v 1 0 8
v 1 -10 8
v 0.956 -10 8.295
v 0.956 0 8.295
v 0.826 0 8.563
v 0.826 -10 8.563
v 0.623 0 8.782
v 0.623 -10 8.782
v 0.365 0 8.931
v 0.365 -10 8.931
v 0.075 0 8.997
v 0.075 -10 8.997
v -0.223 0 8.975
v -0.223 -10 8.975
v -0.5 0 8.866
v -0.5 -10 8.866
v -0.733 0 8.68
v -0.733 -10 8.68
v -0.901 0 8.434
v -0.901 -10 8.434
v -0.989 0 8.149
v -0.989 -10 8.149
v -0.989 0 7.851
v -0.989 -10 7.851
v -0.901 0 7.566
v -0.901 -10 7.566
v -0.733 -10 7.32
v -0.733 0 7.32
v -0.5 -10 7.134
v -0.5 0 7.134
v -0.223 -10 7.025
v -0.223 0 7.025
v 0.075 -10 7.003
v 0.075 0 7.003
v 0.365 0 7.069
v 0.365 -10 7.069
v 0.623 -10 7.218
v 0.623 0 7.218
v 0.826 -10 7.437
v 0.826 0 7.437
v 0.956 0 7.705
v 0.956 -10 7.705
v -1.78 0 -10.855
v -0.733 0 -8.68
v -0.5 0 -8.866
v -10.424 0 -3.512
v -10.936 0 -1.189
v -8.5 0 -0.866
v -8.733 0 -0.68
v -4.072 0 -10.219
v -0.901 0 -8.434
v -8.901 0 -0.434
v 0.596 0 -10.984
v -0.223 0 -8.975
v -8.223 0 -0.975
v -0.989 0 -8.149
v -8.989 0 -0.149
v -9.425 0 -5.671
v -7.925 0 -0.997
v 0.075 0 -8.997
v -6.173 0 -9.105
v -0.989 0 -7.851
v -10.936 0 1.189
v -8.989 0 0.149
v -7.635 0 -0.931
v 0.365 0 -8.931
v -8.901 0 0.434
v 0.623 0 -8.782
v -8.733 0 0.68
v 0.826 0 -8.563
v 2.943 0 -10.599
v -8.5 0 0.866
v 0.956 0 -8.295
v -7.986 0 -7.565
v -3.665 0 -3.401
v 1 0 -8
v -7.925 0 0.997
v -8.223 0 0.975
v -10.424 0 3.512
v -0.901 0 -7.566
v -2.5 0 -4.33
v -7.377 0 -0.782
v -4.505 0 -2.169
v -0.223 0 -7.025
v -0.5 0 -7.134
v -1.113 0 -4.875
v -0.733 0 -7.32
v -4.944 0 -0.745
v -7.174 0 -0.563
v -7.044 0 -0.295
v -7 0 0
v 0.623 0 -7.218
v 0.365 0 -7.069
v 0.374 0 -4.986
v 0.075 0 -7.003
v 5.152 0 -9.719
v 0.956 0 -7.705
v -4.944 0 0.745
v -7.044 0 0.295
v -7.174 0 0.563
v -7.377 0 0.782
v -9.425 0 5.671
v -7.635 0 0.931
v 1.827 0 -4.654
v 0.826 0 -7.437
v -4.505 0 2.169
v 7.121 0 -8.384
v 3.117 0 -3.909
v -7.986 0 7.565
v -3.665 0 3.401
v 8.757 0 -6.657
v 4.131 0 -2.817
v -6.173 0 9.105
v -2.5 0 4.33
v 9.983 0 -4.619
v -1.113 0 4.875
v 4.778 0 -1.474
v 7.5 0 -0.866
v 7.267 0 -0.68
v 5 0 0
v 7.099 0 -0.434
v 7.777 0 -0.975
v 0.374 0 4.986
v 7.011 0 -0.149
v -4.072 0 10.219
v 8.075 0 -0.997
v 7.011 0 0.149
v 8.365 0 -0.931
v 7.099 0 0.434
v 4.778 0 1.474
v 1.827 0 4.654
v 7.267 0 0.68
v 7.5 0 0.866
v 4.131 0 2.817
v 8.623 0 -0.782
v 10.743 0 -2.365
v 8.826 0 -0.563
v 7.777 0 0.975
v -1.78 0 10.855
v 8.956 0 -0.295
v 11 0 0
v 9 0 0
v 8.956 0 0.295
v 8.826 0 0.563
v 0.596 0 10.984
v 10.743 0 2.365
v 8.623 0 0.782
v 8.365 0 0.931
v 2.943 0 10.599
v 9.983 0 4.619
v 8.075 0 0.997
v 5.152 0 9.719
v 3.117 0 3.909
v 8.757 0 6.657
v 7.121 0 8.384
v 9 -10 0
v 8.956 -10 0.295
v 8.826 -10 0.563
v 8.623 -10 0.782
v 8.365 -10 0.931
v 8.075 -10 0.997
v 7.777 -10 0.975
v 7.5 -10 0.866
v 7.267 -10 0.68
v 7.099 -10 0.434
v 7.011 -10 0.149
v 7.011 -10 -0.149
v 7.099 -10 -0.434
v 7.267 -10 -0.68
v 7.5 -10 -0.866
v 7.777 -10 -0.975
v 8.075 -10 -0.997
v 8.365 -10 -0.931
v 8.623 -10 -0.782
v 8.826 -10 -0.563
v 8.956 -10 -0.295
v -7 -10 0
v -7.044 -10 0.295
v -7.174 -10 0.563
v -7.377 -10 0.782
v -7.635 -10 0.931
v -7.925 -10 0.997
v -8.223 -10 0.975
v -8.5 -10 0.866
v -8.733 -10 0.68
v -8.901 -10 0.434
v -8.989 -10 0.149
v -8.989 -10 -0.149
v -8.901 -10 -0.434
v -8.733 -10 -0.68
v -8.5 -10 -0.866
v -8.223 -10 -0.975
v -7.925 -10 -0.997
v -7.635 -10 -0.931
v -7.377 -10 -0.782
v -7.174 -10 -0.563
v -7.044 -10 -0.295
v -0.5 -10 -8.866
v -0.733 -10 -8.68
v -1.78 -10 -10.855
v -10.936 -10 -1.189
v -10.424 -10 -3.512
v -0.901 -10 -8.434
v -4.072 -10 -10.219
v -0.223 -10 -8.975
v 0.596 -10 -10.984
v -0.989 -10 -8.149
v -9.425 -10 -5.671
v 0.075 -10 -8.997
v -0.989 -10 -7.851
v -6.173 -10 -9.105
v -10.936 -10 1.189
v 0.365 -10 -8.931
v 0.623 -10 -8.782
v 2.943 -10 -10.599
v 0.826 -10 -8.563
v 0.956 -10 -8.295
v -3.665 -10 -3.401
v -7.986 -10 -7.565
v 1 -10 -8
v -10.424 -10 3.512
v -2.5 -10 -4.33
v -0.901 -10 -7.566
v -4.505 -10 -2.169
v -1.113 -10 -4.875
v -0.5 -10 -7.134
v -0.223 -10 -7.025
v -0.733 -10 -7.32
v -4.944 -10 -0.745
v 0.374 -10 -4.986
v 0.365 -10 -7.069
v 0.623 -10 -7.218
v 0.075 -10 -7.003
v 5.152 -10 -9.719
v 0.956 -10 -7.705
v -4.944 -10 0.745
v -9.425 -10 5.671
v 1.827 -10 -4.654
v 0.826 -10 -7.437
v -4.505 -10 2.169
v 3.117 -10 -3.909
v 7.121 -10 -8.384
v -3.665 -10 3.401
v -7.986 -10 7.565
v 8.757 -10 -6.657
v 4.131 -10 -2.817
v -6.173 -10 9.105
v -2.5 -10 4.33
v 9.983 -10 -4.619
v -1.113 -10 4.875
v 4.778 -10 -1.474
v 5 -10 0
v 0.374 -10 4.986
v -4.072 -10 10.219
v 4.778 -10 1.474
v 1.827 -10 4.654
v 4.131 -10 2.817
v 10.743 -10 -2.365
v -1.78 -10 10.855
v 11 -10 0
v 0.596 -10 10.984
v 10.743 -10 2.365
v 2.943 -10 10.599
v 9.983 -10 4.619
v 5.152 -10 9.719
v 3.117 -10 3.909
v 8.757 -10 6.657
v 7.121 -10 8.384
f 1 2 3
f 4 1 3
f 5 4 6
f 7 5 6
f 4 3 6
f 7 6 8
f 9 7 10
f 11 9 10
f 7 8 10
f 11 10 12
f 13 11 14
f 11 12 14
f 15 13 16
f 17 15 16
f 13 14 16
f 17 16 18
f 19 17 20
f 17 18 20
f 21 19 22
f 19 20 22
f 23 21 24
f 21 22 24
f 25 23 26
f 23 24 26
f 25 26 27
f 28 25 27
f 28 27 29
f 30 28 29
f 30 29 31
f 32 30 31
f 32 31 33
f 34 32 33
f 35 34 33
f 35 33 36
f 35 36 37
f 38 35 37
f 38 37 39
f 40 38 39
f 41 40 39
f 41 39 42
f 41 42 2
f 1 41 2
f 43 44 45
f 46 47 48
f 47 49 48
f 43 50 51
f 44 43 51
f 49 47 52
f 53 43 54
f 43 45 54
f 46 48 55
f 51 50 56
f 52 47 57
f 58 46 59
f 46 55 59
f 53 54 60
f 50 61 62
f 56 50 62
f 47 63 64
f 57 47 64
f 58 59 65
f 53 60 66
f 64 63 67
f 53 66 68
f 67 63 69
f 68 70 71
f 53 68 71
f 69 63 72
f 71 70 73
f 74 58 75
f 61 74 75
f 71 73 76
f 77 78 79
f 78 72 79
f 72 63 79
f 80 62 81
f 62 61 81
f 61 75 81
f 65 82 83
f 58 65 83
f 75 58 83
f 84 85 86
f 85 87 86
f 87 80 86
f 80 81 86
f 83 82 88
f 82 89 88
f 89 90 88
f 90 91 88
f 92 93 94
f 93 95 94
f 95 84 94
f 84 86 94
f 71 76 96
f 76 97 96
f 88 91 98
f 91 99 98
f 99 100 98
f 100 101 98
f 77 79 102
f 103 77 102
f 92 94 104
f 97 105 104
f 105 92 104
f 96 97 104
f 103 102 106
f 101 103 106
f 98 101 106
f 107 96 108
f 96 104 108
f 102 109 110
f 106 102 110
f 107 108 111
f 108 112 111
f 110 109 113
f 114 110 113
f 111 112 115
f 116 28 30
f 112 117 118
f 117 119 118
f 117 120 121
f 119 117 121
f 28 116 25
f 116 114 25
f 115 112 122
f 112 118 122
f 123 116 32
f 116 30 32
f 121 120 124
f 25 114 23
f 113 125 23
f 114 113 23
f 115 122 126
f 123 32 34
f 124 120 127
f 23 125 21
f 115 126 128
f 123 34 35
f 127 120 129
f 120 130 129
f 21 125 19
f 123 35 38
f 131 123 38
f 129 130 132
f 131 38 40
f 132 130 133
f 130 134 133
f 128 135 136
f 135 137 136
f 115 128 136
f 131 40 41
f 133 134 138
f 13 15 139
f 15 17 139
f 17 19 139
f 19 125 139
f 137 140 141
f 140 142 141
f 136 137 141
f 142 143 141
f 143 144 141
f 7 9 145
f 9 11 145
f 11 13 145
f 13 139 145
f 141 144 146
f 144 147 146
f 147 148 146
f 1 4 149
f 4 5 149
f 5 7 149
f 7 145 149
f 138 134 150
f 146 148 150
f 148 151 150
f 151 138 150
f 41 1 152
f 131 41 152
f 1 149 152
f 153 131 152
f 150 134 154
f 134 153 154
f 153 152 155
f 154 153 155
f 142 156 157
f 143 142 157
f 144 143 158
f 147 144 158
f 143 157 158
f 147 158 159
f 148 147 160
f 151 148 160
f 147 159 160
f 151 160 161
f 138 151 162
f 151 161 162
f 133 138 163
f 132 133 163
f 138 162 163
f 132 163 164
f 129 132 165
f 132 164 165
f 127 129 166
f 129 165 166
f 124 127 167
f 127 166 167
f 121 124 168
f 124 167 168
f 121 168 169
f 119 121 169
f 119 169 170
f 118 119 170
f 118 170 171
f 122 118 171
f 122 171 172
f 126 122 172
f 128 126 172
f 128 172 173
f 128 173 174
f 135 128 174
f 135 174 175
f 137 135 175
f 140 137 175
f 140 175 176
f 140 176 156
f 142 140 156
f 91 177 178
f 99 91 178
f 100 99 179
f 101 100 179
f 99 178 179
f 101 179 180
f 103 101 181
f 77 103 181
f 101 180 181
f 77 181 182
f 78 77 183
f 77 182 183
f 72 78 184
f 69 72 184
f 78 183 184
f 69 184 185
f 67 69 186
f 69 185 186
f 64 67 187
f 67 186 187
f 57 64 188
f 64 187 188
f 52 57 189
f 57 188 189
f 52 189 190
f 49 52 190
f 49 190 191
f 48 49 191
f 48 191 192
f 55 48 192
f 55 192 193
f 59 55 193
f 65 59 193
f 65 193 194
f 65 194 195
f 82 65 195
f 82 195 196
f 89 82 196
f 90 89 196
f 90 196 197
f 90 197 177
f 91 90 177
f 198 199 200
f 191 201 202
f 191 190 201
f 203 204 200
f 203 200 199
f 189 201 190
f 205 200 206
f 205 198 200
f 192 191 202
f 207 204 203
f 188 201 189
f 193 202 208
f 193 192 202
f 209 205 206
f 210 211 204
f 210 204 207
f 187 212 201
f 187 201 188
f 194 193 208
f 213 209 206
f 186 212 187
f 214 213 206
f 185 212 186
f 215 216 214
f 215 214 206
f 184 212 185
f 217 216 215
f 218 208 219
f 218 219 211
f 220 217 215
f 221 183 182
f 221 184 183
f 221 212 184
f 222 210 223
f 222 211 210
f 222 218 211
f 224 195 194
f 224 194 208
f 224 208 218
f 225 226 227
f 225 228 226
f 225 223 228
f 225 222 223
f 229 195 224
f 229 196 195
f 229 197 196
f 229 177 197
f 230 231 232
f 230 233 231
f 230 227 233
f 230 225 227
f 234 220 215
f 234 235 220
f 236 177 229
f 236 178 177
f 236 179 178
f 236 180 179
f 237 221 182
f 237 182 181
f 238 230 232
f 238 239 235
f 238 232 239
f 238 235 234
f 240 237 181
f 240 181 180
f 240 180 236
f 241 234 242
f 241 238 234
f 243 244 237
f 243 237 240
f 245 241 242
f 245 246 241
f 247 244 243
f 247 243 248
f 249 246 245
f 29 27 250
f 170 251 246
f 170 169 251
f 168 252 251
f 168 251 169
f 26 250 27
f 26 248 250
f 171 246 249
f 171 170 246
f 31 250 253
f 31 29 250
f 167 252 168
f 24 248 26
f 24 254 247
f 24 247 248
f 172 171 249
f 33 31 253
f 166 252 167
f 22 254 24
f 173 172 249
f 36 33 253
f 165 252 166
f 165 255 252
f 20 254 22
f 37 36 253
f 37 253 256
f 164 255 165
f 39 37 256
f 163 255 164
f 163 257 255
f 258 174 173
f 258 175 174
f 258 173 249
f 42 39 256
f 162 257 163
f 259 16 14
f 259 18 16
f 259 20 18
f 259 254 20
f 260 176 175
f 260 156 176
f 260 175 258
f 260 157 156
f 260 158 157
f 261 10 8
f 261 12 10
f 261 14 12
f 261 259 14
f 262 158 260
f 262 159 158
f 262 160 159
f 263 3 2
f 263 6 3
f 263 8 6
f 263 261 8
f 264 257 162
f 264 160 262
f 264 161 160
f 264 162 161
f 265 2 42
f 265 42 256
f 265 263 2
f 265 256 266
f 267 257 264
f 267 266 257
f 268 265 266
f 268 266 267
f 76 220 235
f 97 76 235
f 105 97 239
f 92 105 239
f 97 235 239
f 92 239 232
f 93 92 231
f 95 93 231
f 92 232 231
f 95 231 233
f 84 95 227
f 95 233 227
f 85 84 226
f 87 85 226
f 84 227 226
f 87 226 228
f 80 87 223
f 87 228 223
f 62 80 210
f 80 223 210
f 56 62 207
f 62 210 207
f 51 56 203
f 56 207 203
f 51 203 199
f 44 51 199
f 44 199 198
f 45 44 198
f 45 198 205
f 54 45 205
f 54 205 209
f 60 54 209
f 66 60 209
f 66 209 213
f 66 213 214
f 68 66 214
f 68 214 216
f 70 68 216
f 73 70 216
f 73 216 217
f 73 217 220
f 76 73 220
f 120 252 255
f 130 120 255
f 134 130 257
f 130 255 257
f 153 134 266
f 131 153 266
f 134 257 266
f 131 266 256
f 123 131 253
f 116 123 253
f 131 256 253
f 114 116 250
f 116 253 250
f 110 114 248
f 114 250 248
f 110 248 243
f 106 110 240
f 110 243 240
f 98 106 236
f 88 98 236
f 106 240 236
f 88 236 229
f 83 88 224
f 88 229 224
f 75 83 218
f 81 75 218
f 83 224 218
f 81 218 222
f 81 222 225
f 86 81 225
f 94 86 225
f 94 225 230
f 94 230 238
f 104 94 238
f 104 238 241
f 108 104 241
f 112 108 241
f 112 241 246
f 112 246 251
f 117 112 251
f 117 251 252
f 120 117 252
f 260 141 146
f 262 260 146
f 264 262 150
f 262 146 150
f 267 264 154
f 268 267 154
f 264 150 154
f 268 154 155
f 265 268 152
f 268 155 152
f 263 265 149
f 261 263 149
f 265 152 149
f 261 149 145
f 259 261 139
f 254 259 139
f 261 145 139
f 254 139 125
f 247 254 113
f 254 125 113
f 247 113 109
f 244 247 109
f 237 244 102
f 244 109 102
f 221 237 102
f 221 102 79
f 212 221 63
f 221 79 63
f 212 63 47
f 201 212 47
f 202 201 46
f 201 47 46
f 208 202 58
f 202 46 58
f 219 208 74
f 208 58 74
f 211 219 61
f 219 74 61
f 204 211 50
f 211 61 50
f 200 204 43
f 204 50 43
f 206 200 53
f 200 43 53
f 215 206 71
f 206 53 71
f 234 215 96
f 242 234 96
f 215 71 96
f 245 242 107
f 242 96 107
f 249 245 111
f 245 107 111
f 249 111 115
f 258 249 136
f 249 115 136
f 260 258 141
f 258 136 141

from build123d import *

# Parameters (mm, degrees)
F0_R     = 11
F1_DEPTH = 10
F2_R     = 5
F3_DEPTH = 25
F4_R     = 1
F5_DEPTH = 25


with BuildPart() as f1:
    # F0 (on Front) → F1 (new body)
    with BuildSketch(Plane.XZ):
        Circle(F0_R)
    extrude(amount=F1_DEPTH)

    # F2 (on face) → F3 (cut)
    with BuildSketch(Plane.XZ.offset(10)):
        Circle(F2_R)
    extrude(amount=-F3_DEPTH, mode=Mode.SUBTRACT)

    # F4 (on face) → F5 (cut)
    with BuildSketch(Plane.XZ.offset(10)):
        with Locations((-8, 0)):
            Circle(F4_R)
        with Locations((0, 8)):
            Circle(F4_R)
        with Locations((8, 0)):
            Circle(F4_R)
        with Locations((0, -8)):
            Circle(F4_R)
    extrude(amount=-F5_DEPTH, mode=Mode.SUBTRACT)


solid = f1.part
